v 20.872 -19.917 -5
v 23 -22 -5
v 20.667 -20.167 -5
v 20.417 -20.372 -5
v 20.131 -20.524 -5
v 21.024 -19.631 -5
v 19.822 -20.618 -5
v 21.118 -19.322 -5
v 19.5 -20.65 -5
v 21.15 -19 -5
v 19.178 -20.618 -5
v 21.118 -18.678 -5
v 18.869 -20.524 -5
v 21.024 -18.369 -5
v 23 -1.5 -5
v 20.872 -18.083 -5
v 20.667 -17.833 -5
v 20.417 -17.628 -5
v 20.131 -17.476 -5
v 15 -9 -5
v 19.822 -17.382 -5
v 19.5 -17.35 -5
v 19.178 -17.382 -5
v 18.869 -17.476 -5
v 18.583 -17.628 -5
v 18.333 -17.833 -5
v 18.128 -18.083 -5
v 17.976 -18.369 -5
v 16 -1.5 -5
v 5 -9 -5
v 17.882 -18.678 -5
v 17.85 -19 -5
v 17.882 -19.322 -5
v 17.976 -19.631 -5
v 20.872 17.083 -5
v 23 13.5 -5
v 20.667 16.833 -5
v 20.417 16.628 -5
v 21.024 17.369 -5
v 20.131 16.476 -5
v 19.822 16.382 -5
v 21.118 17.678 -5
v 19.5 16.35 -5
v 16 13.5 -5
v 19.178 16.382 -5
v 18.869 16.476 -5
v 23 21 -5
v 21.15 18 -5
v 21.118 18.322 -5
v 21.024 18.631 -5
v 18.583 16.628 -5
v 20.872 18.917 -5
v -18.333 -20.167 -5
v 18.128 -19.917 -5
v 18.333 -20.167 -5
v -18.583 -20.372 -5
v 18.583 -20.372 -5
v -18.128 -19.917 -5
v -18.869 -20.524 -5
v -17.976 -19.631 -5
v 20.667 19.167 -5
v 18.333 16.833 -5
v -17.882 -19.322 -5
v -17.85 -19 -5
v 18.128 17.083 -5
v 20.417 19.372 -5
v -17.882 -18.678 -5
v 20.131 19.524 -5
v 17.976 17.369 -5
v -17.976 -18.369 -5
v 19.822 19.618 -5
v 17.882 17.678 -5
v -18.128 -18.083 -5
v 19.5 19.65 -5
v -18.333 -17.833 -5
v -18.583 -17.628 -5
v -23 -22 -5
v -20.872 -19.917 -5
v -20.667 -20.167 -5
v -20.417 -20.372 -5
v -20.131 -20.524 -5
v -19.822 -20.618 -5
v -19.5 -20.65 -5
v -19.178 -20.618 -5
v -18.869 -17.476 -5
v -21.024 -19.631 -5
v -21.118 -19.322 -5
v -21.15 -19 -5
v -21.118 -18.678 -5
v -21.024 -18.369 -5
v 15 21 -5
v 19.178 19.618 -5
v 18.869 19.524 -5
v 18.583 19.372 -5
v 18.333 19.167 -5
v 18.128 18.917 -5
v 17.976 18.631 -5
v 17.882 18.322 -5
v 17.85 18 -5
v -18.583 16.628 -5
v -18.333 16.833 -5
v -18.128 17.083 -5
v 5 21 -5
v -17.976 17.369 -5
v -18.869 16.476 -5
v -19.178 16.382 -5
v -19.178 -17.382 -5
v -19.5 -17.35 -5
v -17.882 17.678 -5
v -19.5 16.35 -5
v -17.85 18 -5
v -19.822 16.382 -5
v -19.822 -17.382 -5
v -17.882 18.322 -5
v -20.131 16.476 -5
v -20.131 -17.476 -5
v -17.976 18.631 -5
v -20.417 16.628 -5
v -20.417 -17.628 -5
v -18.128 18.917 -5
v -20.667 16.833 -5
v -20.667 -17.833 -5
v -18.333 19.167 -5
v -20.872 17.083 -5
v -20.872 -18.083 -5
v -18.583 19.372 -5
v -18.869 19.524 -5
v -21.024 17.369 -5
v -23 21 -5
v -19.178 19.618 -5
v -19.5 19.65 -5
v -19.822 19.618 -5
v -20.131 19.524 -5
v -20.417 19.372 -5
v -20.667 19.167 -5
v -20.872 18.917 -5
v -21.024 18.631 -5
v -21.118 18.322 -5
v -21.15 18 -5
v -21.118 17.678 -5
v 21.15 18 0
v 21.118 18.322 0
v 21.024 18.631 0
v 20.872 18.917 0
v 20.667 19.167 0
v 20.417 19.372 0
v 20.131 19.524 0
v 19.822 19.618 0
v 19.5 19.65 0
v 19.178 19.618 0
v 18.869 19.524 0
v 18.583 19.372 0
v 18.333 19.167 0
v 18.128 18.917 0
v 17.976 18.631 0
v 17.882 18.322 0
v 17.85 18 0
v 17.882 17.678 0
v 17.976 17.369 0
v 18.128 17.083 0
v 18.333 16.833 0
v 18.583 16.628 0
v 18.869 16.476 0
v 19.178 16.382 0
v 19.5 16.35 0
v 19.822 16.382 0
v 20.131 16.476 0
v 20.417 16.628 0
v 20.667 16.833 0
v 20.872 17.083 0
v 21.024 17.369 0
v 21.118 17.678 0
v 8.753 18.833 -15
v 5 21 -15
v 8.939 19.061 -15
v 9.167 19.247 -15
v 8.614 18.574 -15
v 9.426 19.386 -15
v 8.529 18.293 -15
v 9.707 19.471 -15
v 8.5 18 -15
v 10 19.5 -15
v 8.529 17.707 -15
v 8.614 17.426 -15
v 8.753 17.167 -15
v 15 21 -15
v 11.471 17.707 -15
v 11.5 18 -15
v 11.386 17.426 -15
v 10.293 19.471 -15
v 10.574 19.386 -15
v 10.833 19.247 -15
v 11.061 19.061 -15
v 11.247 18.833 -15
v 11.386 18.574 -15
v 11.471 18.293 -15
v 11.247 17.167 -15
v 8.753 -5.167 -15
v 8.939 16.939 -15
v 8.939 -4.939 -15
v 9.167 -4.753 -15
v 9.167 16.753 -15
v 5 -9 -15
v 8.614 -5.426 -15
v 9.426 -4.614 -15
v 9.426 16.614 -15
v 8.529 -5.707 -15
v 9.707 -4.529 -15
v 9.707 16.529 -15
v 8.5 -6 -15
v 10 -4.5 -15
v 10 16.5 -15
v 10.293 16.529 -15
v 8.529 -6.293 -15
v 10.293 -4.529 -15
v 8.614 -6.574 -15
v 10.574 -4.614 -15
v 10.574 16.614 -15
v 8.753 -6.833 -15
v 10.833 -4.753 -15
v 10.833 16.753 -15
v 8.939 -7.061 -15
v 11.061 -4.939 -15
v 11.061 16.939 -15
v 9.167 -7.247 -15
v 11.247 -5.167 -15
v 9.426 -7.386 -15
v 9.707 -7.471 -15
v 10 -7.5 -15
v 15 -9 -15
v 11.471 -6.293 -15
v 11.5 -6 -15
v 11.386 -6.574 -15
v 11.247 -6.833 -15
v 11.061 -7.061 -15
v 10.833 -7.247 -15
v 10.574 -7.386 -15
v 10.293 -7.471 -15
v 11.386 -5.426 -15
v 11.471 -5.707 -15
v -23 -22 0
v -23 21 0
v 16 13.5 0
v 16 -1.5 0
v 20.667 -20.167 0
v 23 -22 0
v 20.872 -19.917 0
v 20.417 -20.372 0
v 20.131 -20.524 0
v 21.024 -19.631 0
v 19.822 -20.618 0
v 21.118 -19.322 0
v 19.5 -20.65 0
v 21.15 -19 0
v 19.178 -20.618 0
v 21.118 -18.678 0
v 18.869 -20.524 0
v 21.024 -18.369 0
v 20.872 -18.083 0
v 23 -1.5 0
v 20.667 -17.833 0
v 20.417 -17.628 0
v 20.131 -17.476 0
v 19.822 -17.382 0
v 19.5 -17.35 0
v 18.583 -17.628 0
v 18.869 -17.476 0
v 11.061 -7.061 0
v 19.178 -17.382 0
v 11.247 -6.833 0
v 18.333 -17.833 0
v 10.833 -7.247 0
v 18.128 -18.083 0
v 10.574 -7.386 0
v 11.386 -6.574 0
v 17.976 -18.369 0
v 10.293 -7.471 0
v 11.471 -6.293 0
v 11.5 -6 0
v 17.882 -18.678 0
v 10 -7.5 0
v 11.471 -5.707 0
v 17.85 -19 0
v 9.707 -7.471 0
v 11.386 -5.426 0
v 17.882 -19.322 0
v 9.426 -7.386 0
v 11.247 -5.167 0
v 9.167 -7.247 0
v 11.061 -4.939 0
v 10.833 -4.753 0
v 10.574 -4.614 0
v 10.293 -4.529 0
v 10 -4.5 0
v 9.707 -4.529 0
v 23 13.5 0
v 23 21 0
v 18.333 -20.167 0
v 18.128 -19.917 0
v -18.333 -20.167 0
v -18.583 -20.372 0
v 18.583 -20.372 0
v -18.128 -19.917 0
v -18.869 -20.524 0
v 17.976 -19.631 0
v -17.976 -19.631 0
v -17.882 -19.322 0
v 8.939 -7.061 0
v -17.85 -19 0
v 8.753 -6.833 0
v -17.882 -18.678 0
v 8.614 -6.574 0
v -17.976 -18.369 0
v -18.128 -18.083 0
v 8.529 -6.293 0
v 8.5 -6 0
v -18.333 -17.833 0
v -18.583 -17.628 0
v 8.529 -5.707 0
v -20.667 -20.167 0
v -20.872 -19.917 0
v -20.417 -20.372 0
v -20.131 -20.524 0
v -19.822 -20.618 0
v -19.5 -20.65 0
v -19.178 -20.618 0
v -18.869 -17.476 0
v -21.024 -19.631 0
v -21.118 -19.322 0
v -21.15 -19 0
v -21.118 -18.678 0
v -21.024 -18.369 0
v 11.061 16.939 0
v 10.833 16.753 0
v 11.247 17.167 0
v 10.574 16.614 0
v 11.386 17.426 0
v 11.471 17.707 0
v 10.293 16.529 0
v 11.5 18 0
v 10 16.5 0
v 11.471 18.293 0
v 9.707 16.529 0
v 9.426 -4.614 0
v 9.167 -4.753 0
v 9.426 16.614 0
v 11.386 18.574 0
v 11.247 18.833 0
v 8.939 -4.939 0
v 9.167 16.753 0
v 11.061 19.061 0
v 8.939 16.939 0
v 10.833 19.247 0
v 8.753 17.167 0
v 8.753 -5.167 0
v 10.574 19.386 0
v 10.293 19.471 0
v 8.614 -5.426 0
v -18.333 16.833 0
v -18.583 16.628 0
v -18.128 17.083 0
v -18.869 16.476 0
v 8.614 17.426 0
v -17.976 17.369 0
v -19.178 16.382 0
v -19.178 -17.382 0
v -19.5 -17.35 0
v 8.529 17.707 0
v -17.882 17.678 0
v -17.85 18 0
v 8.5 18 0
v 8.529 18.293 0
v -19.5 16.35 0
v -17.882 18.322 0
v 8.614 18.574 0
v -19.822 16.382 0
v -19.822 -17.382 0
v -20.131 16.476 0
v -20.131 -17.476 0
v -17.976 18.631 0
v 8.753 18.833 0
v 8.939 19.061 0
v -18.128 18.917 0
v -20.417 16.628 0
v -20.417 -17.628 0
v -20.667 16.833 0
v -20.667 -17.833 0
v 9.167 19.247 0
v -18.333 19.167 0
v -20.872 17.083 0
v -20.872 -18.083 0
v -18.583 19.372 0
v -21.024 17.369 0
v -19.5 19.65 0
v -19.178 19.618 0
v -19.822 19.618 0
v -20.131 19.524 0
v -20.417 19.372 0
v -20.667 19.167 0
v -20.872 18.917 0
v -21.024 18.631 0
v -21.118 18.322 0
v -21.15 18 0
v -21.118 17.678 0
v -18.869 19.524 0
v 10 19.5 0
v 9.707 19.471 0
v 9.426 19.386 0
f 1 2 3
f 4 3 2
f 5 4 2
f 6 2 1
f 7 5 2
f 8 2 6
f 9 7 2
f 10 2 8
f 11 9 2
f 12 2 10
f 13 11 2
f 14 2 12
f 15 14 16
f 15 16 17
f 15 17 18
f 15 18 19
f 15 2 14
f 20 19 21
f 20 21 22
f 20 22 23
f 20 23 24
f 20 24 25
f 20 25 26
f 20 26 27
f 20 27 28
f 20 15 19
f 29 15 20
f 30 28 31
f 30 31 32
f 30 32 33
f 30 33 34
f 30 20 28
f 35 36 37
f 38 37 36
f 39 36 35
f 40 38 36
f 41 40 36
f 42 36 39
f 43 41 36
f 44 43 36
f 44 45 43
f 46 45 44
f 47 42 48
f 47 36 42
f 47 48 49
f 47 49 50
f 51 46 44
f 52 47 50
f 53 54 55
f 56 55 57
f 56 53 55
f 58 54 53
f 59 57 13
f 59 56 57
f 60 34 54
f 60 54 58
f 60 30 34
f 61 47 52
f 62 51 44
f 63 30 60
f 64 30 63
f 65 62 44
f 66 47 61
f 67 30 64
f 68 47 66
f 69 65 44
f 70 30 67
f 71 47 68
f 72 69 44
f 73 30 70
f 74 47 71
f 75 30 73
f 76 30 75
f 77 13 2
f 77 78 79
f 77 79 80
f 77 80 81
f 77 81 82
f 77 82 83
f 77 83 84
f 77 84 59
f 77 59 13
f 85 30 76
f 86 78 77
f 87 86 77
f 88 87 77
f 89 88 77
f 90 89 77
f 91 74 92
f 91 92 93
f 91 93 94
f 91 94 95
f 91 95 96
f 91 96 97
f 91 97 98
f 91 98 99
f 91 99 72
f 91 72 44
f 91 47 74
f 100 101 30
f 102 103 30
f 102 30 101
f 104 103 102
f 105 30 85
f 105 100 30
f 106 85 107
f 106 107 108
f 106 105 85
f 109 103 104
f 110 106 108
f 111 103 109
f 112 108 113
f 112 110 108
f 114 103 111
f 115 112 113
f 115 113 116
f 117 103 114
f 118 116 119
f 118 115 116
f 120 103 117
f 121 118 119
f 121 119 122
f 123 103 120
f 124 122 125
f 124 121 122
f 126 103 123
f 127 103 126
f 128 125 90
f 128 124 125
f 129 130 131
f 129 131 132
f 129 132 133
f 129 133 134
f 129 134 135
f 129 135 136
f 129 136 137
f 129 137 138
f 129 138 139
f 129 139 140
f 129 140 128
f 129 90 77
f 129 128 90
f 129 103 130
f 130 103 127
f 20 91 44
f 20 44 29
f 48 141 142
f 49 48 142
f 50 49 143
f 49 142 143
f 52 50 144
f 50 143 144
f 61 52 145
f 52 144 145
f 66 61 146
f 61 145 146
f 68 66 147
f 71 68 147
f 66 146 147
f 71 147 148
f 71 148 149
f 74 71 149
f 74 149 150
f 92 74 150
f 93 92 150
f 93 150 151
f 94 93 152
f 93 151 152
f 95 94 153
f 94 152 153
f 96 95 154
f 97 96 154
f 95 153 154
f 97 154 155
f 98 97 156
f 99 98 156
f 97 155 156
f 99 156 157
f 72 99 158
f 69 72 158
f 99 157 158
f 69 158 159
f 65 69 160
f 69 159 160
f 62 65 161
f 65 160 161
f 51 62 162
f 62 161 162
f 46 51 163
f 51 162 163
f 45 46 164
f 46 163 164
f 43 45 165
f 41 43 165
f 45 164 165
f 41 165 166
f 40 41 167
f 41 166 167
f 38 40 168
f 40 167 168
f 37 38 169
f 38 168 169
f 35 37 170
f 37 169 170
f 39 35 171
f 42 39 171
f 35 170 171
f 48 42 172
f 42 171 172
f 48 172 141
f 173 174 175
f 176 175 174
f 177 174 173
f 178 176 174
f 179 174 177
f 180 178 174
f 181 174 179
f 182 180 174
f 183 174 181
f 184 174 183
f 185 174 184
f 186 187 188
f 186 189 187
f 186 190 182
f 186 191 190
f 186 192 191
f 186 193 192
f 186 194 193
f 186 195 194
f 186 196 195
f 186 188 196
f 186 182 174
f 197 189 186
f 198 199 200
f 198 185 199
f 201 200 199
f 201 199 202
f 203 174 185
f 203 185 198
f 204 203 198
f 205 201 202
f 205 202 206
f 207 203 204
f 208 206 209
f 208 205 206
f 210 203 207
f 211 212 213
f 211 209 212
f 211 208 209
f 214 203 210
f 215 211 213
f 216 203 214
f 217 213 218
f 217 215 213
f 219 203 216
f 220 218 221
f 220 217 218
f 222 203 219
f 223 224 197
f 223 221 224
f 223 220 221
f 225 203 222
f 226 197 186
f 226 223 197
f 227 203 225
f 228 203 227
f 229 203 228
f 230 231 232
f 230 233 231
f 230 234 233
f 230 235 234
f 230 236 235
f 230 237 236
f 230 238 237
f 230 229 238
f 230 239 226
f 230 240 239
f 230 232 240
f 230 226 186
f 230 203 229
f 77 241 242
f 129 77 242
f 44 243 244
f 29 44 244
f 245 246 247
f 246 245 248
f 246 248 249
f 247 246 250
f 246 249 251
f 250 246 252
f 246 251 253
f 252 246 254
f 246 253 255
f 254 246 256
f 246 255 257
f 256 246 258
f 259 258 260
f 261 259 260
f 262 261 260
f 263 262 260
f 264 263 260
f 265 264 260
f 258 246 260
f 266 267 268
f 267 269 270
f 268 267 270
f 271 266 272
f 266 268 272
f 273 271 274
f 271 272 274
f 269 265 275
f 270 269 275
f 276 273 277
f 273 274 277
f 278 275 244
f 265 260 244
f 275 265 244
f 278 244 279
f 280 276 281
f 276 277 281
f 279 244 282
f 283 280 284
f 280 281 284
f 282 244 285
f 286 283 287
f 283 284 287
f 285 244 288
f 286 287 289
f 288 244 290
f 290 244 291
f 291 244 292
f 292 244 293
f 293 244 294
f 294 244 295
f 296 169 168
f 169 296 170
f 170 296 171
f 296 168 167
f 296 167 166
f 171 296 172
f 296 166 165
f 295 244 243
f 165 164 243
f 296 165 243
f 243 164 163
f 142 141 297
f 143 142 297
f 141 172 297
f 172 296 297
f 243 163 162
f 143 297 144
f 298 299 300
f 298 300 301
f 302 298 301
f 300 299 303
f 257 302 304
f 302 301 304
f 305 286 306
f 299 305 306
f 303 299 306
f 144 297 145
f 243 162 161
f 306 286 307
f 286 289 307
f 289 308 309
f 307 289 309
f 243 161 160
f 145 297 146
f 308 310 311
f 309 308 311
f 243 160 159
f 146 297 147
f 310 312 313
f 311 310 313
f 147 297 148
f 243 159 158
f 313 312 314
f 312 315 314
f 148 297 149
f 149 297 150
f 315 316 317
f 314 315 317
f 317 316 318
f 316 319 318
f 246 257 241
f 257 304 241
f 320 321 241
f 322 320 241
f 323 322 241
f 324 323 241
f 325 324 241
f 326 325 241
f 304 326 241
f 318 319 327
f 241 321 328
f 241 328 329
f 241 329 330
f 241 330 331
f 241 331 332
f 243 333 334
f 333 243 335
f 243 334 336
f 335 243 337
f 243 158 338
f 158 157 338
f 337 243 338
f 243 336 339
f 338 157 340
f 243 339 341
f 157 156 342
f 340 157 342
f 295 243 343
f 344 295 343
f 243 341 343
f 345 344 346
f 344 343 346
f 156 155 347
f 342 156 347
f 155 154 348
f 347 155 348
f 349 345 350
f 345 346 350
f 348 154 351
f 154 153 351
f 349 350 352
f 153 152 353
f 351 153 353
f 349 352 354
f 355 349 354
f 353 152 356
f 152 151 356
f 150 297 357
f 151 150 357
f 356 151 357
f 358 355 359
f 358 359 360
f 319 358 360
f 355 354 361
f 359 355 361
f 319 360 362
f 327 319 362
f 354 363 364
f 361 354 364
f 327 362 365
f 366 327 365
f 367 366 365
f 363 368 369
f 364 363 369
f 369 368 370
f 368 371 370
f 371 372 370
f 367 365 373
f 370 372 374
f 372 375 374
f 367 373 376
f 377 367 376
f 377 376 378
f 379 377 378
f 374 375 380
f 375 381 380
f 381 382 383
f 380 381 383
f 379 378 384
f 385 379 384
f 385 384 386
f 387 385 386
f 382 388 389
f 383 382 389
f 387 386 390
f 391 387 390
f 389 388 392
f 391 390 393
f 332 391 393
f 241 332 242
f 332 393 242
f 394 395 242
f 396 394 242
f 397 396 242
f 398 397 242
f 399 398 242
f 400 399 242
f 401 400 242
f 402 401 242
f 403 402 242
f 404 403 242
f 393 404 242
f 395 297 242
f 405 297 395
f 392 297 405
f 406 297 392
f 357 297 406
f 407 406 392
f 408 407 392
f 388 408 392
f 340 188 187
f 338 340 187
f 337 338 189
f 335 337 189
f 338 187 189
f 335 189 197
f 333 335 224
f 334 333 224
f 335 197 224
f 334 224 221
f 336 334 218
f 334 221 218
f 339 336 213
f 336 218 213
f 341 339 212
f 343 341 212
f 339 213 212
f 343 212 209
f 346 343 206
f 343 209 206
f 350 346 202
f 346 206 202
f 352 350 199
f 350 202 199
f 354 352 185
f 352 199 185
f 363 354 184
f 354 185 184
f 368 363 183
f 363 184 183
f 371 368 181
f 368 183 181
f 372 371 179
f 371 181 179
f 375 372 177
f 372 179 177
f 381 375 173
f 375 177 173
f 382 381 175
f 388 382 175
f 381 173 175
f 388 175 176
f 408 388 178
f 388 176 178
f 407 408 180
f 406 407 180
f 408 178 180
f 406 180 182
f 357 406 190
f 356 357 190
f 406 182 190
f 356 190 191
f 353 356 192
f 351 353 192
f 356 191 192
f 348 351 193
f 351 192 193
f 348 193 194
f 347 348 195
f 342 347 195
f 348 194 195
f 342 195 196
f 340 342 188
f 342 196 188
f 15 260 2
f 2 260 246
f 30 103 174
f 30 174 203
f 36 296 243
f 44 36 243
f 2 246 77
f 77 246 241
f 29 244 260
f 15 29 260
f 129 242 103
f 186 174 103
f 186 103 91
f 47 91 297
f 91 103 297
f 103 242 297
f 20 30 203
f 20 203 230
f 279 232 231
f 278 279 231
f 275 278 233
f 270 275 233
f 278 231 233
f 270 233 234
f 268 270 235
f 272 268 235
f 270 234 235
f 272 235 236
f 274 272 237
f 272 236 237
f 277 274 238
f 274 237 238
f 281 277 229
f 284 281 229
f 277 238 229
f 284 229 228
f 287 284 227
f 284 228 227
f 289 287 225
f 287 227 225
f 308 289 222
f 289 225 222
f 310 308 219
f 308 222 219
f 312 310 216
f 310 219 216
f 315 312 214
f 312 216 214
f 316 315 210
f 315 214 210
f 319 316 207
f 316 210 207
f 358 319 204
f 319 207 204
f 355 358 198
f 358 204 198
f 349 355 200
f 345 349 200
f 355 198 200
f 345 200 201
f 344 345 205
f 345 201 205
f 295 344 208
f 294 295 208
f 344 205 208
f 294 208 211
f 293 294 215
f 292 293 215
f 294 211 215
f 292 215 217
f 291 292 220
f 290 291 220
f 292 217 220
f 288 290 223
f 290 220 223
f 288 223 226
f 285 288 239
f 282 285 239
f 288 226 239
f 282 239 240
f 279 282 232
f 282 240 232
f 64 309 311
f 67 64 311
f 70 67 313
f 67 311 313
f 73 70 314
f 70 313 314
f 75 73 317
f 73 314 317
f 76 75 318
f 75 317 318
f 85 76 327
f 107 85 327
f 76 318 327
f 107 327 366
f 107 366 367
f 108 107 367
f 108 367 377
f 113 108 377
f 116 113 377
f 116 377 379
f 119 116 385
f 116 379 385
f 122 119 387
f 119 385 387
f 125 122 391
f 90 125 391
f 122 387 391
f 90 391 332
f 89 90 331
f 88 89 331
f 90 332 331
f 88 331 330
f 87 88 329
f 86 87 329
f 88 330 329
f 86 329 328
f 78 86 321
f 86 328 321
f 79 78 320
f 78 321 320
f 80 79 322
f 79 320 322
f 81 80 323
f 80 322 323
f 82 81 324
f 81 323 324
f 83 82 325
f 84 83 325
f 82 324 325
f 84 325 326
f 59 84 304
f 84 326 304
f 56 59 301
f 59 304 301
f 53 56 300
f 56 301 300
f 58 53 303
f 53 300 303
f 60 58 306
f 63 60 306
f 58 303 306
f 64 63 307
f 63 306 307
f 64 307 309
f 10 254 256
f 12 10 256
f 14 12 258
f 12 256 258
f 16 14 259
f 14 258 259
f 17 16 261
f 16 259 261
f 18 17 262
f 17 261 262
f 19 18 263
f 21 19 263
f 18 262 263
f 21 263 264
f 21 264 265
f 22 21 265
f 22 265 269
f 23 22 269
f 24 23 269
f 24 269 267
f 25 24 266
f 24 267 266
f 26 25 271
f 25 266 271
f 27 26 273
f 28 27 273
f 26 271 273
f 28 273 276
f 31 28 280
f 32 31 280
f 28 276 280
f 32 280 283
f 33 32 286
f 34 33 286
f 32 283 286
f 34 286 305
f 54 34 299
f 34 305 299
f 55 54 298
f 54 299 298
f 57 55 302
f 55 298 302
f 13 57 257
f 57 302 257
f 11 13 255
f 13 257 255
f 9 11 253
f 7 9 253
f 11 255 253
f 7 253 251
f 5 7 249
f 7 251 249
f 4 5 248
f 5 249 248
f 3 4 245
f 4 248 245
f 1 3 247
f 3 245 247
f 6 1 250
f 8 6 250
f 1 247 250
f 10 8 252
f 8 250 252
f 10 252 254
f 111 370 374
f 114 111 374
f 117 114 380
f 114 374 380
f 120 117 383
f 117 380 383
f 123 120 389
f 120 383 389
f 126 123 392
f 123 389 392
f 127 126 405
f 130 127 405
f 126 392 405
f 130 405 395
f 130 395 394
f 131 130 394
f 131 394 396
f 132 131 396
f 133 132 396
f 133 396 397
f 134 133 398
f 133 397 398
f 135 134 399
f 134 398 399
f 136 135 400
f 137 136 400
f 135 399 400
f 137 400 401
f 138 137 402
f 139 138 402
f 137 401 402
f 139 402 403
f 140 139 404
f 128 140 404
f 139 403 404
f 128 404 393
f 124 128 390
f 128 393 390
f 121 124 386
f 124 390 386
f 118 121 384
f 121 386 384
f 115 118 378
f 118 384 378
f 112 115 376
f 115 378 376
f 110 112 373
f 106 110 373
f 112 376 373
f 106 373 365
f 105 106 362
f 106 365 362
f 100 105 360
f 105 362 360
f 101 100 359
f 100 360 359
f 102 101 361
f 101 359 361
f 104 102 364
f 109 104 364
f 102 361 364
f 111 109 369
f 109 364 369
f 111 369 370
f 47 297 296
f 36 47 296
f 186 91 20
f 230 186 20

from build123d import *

# Parameters (mm, degrees)
SKETCH_R     = 1.65
PAD_DEPTH    = 5
SKETCH001_W  = 10
SKETCH001_H  = 30
PAD001_DEPTH = 10
SKETCH002_R  = 1.5
POCKET_DEPTH = 15


with BuildPart() as part:
    # Sketch → Pad (new body)
    with BuildSketch(Plane.XY):
        Polygon((-23, 21), (23, 21), (23, 13.5), (16, 13.5), (16, -1.5), (23, -1.5), (23, -22), (-23, -22), align=None)
        with Locations((-19.5, 18)):
            Circle(SKETCH_R, mode=Mode.SUBTRACT)
        with Locations((19.5, 18)):
            Circle(SKETCH_R, mode=Mode.SUBTRACT)
        with Locations((-19.5, -19)):
            Circle(SKETCH_R, mode=Mode.SUBTRACT)
        with Locations((19.5, -19)):
            Circle(SKETCH_R, mode=Mode.SUBTRACT)
    extrude(amount=-PAD_DEPTH)

    # Sketch001 (on Face14 of Pad) → Pad001 (join)
    with BuildSketch(Plane(origin=(0, 0, -5), x_dir=(1, 0, 0), z_dir=(0, 0, -1))):
        with Locations((10, -6)):
            Rectangle(SKETCH001_W, SKETCH001_H)
    extrude(amount=PAD001_DEPTH)

    # Sketch002 (on Face17 of Pad001) → Pocket (cut)
    with BuildSketch(Plane(origin=(0, 0, -15), x_dir=(1, 0, 0), z_dir=(0, 0, -1))):
        with Locations((10, 6)):
            Circle(SKETCH002_R)
        with Locations((10, -18)):
            Circle(SKETCH002_R)
    extrude(amount=-POCKET_DEPTH, mode=Mode.SUBTRACT)


solid = part.part
